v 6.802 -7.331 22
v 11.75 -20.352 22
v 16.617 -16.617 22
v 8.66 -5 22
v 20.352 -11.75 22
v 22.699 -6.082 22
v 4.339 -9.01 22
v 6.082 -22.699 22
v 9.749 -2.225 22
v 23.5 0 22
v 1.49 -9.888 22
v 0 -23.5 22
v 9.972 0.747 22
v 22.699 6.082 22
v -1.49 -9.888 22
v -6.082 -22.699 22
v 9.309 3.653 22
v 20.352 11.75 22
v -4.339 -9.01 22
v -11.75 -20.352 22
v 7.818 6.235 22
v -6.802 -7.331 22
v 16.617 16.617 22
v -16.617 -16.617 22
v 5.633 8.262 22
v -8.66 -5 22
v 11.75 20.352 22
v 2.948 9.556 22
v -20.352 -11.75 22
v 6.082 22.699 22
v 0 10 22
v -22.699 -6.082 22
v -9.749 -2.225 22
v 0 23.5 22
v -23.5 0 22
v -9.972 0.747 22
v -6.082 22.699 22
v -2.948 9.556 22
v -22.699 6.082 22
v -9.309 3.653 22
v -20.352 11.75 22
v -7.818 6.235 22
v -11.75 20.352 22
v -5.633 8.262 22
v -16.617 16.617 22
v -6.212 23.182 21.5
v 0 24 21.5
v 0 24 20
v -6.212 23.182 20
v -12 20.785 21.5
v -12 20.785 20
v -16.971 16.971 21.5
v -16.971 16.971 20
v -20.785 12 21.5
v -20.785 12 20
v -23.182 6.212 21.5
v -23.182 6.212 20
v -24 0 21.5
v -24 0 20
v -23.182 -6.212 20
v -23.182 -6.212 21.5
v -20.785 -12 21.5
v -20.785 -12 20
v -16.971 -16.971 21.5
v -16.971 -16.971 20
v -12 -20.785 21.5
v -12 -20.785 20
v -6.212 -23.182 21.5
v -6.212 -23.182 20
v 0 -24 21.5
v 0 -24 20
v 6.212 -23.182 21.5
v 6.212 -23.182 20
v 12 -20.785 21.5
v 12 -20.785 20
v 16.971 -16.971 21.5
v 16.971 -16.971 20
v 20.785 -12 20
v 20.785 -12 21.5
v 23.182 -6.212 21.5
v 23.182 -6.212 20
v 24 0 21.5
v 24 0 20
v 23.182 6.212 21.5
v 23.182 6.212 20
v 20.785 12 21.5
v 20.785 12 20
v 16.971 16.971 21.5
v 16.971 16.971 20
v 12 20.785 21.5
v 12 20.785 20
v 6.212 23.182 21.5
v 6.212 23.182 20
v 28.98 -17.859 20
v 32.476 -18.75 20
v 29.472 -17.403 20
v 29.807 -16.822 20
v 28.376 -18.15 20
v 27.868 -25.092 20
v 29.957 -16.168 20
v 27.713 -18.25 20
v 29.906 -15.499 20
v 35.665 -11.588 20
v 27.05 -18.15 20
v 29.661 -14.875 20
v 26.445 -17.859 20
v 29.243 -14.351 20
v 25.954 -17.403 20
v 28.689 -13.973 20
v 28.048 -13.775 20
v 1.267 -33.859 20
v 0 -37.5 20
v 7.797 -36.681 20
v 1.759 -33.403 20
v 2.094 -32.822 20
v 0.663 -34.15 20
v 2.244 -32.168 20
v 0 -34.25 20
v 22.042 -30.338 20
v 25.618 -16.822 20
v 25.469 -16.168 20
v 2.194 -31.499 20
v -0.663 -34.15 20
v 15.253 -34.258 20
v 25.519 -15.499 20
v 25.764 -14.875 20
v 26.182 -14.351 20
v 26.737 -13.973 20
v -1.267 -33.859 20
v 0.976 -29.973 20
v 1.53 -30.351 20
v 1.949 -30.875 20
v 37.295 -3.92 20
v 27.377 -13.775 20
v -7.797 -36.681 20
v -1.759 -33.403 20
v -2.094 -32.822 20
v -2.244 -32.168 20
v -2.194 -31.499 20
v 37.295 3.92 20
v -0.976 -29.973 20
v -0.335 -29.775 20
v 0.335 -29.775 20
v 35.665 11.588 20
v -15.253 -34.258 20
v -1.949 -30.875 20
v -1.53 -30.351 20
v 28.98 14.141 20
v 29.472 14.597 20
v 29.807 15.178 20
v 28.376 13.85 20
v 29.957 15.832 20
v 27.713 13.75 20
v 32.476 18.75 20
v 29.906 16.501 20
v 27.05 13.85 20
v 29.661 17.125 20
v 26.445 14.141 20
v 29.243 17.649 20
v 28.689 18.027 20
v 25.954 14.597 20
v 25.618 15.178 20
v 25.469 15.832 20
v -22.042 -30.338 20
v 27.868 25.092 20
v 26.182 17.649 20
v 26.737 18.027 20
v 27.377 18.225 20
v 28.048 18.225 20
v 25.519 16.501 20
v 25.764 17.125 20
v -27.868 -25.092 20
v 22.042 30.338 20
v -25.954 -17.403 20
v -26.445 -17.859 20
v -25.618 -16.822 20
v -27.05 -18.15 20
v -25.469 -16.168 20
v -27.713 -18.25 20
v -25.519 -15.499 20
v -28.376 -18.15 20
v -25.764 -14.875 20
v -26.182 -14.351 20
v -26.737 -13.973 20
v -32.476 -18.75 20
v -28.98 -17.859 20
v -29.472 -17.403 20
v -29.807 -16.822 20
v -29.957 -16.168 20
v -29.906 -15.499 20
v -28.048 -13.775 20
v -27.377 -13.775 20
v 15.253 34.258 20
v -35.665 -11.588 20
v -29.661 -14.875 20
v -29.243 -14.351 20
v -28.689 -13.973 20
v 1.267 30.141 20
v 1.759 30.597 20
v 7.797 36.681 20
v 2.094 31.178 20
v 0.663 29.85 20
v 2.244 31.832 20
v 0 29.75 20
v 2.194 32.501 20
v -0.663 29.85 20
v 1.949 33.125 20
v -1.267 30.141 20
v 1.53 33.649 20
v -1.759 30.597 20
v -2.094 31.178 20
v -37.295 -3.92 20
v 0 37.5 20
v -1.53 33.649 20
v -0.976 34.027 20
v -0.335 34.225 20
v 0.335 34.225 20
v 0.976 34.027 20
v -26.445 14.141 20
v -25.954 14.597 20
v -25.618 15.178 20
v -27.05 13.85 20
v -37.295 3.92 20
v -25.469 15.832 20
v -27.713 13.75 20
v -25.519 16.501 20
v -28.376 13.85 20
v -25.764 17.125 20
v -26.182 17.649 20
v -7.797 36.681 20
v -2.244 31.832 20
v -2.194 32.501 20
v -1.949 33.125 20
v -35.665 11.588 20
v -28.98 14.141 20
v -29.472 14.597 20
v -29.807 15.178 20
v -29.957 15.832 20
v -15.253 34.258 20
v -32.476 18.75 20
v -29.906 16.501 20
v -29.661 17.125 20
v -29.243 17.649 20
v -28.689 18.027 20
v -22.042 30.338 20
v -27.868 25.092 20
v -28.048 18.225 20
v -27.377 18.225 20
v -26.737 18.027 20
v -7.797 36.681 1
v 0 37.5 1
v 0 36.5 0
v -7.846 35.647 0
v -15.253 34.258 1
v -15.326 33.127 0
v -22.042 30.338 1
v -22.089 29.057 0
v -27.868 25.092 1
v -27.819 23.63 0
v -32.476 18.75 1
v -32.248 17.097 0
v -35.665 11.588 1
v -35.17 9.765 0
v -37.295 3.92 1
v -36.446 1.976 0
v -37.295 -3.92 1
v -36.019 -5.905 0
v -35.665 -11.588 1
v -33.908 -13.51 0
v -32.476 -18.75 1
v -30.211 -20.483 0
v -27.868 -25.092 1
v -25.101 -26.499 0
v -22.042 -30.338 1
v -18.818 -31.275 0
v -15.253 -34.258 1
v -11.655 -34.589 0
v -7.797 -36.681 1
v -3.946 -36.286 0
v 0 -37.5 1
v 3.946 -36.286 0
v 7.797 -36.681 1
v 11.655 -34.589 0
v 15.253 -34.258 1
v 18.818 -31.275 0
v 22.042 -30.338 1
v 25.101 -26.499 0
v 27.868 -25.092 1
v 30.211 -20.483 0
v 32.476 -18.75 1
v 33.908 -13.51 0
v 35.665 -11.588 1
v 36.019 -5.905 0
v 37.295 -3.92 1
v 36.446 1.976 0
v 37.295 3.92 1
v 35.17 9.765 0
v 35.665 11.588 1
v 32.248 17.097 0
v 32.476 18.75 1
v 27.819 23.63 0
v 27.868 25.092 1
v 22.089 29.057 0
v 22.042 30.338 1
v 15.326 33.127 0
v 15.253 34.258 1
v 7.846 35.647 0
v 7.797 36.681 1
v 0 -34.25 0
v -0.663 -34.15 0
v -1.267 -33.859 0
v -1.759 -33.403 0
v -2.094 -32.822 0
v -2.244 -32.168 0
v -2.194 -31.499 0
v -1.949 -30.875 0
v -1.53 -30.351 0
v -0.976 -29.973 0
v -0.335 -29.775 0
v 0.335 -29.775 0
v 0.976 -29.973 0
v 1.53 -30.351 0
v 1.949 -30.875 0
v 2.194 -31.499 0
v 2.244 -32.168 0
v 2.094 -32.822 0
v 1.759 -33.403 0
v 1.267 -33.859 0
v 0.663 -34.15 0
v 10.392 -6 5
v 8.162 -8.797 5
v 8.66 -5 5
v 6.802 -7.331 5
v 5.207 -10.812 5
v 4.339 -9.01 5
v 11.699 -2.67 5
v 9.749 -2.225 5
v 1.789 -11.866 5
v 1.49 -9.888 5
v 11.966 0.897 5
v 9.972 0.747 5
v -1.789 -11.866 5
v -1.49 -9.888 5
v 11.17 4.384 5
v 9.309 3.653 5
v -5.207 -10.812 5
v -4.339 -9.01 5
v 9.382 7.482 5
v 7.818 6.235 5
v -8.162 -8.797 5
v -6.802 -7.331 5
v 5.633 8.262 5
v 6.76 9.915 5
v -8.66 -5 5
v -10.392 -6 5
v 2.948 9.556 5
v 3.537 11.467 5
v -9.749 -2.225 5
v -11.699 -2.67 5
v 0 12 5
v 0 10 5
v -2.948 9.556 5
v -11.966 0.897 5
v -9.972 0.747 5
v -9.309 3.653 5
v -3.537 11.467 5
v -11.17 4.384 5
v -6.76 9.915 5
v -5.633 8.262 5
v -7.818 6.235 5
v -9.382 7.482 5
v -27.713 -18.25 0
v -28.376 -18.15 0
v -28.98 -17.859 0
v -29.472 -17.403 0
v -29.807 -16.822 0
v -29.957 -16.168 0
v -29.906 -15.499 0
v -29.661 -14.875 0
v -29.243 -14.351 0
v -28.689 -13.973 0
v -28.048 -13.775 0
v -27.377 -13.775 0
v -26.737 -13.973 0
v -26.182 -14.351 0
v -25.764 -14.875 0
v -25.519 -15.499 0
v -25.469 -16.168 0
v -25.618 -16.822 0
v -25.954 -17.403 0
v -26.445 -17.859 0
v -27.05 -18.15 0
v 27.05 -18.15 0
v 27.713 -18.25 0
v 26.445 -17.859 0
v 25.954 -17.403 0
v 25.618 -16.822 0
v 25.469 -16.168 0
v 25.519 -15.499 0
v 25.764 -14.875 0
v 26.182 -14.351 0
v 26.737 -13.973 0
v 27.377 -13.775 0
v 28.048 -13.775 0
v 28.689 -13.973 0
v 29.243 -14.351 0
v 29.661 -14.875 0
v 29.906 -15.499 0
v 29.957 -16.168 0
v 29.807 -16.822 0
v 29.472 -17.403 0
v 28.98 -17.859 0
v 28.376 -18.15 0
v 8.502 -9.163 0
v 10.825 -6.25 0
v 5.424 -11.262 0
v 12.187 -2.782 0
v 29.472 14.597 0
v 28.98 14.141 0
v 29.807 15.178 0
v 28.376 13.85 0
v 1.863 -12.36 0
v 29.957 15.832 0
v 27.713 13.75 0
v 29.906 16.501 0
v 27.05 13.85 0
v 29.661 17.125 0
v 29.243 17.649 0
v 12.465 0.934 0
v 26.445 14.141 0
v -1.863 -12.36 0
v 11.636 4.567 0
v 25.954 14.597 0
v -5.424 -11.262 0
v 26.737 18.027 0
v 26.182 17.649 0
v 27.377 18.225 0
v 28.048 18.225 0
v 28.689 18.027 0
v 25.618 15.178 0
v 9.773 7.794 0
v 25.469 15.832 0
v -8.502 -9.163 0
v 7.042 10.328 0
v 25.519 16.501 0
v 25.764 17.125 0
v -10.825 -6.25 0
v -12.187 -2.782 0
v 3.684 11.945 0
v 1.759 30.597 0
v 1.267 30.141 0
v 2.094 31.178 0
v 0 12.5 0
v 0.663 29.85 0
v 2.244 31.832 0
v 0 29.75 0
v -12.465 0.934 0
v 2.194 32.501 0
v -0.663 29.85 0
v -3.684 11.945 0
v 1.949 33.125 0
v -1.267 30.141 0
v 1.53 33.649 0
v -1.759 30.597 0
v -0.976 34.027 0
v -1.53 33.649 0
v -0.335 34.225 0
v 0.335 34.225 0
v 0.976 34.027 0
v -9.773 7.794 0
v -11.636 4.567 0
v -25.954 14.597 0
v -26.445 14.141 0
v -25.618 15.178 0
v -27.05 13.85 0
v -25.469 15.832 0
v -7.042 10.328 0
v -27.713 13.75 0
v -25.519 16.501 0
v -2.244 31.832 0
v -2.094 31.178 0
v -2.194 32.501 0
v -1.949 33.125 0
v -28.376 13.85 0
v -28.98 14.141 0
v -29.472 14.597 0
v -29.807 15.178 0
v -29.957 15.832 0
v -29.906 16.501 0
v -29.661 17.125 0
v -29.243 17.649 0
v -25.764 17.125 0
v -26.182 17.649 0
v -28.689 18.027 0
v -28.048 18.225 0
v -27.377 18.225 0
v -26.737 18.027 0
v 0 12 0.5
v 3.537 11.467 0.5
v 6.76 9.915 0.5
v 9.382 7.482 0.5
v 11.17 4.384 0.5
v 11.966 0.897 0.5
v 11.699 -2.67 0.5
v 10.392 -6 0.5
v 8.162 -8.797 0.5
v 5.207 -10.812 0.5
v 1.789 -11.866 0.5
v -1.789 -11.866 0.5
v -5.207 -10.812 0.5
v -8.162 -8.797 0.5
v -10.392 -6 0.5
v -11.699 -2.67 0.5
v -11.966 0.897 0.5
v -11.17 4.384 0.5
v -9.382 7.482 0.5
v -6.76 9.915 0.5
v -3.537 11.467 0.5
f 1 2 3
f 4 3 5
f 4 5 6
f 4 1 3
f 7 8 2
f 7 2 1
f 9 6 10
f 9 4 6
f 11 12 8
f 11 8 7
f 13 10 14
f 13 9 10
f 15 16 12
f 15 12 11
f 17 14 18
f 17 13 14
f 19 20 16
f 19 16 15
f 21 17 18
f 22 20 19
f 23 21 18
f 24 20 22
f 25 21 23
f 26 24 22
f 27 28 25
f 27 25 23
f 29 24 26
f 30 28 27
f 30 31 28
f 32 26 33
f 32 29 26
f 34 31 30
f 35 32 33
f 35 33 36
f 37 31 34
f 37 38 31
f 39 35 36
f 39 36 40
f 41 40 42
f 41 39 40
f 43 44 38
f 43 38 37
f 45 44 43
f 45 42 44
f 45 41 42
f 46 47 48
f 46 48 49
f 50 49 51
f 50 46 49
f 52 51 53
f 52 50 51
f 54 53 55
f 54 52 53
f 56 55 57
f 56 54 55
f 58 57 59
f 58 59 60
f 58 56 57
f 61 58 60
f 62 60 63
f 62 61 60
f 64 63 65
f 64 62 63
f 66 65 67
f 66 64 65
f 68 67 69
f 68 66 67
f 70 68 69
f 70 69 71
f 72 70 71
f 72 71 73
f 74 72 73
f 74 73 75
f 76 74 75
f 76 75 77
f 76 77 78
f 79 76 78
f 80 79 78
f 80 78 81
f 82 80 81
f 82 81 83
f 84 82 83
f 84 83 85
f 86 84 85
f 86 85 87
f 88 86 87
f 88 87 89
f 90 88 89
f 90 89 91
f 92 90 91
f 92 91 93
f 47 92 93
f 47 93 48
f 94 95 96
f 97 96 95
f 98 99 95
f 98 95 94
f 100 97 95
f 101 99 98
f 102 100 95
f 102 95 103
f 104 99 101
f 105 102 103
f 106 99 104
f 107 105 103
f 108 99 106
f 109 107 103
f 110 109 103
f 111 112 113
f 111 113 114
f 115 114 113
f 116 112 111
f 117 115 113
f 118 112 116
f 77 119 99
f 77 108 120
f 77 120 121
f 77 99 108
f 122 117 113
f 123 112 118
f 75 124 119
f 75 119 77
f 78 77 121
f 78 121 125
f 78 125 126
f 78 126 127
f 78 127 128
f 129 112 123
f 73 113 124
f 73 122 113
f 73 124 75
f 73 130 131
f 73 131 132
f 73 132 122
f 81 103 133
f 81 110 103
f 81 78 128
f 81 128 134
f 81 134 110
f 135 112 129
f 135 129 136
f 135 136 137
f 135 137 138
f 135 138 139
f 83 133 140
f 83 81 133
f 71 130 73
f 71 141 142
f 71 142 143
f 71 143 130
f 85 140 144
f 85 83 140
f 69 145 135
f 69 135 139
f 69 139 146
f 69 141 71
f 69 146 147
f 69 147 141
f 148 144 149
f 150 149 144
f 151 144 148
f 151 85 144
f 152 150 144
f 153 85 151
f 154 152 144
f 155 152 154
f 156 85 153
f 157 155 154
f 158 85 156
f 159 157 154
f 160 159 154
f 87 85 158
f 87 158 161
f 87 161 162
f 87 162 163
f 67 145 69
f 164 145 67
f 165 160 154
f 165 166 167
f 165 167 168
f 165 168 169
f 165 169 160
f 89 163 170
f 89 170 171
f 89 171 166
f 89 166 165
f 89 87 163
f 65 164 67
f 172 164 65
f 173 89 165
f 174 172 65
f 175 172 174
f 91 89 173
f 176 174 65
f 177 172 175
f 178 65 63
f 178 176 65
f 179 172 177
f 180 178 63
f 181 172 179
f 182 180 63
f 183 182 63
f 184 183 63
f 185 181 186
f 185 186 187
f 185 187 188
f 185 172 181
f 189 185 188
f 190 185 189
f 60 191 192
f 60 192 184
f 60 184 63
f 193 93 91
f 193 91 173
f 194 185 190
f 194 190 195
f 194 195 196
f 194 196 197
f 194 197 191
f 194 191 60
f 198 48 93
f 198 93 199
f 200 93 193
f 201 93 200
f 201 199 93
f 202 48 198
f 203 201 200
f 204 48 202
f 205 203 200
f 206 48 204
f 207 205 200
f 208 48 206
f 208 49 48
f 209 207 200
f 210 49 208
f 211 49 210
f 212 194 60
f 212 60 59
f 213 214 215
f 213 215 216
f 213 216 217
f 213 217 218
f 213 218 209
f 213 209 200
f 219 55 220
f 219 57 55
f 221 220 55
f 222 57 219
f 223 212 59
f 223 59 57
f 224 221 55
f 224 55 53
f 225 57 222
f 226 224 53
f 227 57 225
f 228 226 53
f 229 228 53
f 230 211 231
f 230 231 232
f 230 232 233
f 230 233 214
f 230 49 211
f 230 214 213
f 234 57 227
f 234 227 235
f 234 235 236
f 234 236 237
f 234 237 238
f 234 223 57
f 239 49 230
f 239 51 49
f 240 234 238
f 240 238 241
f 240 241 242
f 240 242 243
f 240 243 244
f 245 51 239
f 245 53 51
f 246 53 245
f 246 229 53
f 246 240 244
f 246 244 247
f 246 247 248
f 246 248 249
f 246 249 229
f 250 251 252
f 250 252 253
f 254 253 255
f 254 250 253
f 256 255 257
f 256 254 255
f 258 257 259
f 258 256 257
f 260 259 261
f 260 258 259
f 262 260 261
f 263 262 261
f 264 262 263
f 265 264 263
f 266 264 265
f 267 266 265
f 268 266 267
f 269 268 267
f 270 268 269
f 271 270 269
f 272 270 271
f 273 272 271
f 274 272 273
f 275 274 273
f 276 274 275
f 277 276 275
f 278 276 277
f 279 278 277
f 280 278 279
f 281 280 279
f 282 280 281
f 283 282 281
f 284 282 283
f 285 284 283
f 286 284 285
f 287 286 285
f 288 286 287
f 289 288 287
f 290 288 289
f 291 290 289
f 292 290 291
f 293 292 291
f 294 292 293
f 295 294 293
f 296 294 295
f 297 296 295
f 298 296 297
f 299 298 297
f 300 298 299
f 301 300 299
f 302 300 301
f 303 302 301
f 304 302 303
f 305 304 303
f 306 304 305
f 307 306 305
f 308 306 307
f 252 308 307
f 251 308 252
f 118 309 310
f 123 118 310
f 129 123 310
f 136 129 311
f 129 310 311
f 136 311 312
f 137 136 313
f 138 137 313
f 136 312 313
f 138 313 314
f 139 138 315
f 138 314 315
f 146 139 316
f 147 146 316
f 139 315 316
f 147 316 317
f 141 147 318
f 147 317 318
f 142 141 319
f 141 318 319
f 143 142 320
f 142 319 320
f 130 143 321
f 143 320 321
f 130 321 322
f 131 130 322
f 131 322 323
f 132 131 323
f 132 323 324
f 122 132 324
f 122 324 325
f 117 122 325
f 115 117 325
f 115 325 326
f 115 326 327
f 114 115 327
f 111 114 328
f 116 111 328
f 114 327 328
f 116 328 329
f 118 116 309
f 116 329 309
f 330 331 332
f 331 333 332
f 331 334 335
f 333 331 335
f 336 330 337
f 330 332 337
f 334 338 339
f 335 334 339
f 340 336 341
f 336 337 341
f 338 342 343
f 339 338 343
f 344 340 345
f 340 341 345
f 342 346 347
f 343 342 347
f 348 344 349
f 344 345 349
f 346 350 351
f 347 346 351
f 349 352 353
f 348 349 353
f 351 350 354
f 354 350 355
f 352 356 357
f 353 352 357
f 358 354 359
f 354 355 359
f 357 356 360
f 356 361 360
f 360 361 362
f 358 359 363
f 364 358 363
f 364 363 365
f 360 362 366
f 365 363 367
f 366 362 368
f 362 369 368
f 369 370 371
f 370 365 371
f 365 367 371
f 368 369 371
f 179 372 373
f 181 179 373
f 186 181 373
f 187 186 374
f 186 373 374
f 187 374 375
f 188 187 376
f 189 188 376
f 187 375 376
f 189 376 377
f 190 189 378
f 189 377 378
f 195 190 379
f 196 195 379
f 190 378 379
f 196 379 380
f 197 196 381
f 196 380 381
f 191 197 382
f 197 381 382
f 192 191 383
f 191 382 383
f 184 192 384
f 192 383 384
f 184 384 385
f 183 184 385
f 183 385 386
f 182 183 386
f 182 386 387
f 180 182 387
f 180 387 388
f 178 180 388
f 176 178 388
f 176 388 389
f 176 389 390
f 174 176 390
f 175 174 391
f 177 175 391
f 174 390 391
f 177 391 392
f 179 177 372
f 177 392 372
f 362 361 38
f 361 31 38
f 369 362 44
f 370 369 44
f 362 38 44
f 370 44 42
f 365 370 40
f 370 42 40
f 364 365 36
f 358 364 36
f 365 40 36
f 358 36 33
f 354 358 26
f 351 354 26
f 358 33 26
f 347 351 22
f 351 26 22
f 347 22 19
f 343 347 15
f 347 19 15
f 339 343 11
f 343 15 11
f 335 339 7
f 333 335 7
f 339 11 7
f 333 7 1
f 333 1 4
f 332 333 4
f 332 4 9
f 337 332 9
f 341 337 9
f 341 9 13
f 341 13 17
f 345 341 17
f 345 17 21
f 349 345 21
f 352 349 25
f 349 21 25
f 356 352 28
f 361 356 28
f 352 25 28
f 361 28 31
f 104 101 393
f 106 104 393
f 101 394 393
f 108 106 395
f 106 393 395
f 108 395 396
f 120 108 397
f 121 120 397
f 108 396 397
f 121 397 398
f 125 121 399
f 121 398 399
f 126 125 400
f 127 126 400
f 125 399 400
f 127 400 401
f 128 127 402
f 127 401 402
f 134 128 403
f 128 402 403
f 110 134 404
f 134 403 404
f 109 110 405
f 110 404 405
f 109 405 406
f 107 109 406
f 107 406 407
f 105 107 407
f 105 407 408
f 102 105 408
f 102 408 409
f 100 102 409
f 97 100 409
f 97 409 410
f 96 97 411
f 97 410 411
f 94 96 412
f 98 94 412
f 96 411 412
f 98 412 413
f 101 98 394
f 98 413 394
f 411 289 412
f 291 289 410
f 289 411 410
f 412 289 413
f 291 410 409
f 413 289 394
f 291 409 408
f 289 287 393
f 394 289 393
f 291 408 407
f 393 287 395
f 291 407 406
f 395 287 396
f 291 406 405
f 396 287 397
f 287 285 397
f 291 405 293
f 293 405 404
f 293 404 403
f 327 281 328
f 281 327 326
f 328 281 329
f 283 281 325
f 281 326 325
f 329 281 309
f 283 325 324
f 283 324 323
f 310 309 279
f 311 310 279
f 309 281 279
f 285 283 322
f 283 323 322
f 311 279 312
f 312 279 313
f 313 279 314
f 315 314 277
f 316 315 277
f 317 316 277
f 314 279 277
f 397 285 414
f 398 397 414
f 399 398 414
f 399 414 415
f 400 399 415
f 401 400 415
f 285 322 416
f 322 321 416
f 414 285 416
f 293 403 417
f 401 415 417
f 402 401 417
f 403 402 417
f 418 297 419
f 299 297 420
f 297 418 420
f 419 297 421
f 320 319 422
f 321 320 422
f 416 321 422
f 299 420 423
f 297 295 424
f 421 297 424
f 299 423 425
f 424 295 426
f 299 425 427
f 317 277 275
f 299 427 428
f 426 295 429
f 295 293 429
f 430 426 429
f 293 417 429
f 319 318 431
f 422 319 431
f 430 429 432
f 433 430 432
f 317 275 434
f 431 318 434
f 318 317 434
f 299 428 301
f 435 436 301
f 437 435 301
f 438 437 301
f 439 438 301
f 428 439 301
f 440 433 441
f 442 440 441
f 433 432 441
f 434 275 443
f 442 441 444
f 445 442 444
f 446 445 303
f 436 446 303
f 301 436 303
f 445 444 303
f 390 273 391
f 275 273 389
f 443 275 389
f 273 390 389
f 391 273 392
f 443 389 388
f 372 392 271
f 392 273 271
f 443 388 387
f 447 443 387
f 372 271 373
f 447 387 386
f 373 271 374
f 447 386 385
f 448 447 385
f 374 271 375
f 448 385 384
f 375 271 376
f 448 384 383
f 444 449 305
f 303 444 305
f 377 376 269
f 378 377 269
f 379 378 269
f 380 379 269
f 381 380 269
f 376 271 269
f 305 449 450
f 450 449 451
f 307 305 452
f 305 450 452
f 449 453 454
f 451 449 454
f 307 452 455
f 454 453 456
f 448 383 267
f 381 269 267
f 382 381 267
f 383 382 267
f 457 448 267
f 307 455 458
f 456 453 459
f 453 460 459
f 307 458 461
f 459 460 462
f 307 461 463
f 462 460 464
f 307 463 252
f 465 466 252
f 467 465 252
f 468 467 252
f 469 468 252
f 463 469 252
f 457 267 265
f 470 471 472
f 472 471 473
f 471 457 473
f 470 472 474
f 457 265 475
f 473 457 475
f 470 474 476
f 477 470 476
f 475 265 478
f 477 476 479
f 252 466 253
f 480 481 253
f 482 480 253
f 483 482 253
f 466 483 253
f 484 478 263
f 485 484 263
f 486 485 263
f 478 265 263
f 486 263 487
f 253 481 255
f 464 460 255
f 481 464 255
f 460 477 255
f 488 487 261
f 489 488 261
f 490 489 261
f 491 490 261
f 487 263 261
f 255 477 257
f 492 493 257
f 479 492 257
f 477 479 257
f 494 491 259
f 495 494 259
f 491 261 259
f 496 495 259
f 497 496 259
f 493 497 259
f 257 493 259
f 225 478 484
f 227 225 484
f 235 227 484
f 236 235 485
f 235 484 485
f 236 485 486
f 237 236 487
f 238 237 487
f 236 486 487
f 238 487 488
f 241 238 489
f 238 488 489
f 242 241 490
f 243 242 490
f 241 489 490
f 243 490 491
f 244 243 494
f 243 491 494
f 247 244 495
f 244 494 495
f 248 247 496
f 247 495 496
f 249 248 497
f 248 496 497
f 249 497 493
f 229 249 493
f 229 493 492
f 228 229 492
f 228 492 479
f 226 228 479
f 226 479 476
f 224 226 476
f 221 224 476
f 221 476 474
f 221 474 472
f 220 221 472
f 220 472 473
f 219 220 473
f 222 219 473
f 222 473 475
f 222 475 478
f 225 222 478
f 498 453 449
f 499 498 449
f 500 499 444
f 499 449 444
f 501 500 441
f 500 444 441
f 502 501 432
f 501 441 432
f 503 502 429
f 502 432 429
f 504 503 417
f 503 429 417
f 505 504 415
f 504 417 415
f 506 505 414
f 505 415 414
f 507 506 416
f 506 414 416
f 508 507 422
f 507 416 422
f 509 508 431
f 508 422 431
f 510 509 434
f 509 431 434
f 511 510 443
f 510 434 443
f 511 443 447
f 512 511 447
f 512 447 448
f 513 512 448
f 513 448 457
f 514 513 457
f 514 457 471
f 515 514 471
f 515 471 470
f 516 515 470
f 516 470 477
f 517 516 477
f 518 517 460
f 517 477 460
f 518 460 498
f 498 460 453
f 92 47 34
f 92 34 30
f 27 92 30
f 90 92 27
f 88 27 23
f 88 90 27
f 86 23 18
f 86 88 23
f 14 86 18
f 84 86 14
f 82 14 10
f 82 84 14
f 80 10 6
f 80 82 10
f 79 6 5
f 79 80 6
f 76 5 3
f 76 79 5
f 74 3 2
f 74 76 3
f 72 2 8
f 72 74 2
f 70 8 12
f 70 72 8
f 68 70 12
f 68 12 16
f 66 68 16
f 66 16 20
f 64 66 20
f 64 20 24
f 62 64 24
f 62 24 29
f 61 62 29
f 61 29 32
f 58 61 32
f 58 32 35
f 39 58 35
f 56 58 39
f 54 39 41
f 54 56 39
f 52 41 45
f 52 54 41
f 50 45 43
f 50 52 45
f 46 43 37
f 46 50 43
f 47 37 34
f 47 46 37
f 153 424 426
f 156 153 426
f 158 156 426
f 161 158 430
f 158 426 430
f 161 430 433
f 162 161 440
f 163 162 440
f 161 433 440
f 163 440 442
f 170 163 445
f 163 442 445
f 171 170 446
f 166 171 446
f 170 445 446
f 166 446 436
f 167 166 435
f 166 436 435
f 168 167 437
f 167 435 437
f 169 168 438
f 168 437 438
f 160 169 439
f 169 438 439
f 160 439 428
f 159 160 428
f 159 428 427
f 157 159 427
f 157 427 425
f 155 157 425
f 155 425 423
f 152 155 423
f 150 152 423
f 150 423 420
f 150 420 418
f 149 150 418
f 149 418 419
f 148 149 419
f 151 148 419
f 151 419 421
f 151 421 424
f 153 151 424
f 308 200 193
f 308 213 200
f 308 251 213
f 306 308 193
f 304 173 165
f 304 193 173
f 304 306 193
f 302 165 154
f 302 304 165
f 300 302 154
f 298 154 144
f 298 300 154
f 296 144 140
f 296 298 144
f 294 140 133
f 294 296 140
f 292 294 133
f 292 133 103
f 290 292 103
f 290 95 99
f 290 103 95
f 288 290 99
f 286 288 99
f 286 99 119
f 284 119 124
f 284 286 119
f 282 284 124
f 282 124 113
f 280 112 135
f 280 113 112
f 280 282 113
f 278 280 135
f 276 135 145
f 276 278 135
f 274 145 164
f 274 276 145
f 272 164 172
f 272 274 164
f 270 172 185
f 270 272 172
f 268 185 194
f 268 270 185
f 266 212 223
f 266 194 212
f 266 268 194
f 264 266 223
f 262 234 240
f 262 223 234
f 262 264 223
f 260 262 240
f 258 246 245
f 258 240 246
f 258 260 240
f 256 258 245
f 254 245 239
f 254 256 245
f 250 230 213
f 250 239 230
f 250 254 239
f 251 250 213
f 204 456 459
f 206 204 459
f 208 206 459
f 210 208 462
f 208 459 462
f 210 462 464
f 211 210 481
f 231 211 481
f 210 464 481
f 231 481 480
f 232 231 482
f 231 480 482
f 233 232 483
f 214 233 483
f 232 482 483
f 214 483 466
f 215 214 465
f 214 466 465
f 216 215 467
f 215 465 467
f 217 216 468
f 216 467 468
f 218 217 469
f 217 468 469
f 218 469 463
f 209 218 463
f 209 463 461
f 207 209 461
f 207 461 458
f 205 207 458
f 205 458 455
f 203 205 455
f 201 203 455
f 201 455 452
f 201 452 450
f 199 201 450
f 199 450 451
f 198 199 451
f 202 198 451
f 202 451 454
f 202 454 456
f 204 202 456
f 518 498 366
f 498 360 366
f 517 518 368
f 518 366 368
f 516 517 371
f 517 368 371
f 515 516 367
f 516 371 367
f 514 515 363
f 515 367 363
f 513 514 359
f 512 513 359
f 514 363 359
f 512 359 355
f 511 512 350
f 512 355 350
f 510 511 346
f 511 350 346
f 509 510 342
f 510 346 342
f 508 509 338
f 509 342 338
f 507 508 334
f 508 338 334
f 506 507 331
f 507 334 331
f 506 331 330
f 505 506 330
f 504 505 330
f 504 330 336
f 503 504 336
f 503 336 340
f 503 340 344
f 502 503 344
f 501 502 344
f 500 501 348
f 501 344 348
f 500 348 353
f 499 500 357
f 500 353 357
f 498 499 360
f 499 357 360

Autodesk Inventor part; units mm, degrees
ref_plane "YZ Plane" through (0, 0, 0) normal (1, 0, 0) x (0, 1, 0)
ref_plane "XZ Plane" through (0, 0, 0) normal (0, 1, 0) x (-1, 0, 0)
ref_plane "XY Plane" through (0, 0, 0) normal (0, 0, 1) x (1, 0, 0)
sketch "スケッチ1" plane through (0, 0, 0) normal (1, 0, 0) x (0, 1, 0)
  line L0 (12, 0) -> (12, 5)
  line L1 (12, 5) -> (10, 5)
  line L2 (10, 5) -> (10, 22)
  line L3 (24, 20) -> (37.5, 20)
  line L4 (37.5, 20) -> (37.5, 0)
  line L5 (37.5, 0) -> (12, 0)
  line L6 (0, -4.4) -> (0, 26.4) projected
  line L7 (24, 20) -> (24, 22)
  line L8 (24, 22) -> (10, 22)
  point P0 (0, 0)
  dimension "d0" = 12
  dimension "d1" = 37.5
  dimension "d2" = 2
  dimension "d3" = 5
  dimension "d5" = 20
  dimension "d28" = 2
  dimension "d29" = 24
revolve "回転1" add sketch "スケッチ1" angle 360 about axis through (0, 0, -10) along (0, 0, 1)
chamfer "面取り1" distance 0.5 angle 45 1 edges at (0, -12, 0)
sketch "スケッチ2" plane through (0, 0, 20) normal (0, 0, 1) x (1, 0, 0)
  circle A0 centre (0, 0) radius 32
  point P0 (0, 32)
  point P1 (-27.7128, 16)
  point P2 (-27.7128, -16)
  point P3 (0, -32)
  point P4 (27.7128, -16)
  point P5 (27.7128, 16)
  dimension "d10" = 64
  dimension "d13" = 360
hole "穴1" at (0, 32, 20) at (-27.7128, 16, 20) at (-27.7128, -16, 20) at (0, -32, 20) at (27.7128, -16, 20) at (27.7128, 16, 20) direction (0, 0, -1) diameter 4.5 end through all clearance for "Flat Head Machine Screw" size "M4" standard "Ansi Metric M Profile"
chamfer "面取り2" distance 1 angle 45 1 edges at (0, -37.5, 0)
chamfer "面取り3" distance 0.5 angle 45 1 edges at (0, -24, 22)
properties part number "unit-base2" material "ABS プラスチック"
